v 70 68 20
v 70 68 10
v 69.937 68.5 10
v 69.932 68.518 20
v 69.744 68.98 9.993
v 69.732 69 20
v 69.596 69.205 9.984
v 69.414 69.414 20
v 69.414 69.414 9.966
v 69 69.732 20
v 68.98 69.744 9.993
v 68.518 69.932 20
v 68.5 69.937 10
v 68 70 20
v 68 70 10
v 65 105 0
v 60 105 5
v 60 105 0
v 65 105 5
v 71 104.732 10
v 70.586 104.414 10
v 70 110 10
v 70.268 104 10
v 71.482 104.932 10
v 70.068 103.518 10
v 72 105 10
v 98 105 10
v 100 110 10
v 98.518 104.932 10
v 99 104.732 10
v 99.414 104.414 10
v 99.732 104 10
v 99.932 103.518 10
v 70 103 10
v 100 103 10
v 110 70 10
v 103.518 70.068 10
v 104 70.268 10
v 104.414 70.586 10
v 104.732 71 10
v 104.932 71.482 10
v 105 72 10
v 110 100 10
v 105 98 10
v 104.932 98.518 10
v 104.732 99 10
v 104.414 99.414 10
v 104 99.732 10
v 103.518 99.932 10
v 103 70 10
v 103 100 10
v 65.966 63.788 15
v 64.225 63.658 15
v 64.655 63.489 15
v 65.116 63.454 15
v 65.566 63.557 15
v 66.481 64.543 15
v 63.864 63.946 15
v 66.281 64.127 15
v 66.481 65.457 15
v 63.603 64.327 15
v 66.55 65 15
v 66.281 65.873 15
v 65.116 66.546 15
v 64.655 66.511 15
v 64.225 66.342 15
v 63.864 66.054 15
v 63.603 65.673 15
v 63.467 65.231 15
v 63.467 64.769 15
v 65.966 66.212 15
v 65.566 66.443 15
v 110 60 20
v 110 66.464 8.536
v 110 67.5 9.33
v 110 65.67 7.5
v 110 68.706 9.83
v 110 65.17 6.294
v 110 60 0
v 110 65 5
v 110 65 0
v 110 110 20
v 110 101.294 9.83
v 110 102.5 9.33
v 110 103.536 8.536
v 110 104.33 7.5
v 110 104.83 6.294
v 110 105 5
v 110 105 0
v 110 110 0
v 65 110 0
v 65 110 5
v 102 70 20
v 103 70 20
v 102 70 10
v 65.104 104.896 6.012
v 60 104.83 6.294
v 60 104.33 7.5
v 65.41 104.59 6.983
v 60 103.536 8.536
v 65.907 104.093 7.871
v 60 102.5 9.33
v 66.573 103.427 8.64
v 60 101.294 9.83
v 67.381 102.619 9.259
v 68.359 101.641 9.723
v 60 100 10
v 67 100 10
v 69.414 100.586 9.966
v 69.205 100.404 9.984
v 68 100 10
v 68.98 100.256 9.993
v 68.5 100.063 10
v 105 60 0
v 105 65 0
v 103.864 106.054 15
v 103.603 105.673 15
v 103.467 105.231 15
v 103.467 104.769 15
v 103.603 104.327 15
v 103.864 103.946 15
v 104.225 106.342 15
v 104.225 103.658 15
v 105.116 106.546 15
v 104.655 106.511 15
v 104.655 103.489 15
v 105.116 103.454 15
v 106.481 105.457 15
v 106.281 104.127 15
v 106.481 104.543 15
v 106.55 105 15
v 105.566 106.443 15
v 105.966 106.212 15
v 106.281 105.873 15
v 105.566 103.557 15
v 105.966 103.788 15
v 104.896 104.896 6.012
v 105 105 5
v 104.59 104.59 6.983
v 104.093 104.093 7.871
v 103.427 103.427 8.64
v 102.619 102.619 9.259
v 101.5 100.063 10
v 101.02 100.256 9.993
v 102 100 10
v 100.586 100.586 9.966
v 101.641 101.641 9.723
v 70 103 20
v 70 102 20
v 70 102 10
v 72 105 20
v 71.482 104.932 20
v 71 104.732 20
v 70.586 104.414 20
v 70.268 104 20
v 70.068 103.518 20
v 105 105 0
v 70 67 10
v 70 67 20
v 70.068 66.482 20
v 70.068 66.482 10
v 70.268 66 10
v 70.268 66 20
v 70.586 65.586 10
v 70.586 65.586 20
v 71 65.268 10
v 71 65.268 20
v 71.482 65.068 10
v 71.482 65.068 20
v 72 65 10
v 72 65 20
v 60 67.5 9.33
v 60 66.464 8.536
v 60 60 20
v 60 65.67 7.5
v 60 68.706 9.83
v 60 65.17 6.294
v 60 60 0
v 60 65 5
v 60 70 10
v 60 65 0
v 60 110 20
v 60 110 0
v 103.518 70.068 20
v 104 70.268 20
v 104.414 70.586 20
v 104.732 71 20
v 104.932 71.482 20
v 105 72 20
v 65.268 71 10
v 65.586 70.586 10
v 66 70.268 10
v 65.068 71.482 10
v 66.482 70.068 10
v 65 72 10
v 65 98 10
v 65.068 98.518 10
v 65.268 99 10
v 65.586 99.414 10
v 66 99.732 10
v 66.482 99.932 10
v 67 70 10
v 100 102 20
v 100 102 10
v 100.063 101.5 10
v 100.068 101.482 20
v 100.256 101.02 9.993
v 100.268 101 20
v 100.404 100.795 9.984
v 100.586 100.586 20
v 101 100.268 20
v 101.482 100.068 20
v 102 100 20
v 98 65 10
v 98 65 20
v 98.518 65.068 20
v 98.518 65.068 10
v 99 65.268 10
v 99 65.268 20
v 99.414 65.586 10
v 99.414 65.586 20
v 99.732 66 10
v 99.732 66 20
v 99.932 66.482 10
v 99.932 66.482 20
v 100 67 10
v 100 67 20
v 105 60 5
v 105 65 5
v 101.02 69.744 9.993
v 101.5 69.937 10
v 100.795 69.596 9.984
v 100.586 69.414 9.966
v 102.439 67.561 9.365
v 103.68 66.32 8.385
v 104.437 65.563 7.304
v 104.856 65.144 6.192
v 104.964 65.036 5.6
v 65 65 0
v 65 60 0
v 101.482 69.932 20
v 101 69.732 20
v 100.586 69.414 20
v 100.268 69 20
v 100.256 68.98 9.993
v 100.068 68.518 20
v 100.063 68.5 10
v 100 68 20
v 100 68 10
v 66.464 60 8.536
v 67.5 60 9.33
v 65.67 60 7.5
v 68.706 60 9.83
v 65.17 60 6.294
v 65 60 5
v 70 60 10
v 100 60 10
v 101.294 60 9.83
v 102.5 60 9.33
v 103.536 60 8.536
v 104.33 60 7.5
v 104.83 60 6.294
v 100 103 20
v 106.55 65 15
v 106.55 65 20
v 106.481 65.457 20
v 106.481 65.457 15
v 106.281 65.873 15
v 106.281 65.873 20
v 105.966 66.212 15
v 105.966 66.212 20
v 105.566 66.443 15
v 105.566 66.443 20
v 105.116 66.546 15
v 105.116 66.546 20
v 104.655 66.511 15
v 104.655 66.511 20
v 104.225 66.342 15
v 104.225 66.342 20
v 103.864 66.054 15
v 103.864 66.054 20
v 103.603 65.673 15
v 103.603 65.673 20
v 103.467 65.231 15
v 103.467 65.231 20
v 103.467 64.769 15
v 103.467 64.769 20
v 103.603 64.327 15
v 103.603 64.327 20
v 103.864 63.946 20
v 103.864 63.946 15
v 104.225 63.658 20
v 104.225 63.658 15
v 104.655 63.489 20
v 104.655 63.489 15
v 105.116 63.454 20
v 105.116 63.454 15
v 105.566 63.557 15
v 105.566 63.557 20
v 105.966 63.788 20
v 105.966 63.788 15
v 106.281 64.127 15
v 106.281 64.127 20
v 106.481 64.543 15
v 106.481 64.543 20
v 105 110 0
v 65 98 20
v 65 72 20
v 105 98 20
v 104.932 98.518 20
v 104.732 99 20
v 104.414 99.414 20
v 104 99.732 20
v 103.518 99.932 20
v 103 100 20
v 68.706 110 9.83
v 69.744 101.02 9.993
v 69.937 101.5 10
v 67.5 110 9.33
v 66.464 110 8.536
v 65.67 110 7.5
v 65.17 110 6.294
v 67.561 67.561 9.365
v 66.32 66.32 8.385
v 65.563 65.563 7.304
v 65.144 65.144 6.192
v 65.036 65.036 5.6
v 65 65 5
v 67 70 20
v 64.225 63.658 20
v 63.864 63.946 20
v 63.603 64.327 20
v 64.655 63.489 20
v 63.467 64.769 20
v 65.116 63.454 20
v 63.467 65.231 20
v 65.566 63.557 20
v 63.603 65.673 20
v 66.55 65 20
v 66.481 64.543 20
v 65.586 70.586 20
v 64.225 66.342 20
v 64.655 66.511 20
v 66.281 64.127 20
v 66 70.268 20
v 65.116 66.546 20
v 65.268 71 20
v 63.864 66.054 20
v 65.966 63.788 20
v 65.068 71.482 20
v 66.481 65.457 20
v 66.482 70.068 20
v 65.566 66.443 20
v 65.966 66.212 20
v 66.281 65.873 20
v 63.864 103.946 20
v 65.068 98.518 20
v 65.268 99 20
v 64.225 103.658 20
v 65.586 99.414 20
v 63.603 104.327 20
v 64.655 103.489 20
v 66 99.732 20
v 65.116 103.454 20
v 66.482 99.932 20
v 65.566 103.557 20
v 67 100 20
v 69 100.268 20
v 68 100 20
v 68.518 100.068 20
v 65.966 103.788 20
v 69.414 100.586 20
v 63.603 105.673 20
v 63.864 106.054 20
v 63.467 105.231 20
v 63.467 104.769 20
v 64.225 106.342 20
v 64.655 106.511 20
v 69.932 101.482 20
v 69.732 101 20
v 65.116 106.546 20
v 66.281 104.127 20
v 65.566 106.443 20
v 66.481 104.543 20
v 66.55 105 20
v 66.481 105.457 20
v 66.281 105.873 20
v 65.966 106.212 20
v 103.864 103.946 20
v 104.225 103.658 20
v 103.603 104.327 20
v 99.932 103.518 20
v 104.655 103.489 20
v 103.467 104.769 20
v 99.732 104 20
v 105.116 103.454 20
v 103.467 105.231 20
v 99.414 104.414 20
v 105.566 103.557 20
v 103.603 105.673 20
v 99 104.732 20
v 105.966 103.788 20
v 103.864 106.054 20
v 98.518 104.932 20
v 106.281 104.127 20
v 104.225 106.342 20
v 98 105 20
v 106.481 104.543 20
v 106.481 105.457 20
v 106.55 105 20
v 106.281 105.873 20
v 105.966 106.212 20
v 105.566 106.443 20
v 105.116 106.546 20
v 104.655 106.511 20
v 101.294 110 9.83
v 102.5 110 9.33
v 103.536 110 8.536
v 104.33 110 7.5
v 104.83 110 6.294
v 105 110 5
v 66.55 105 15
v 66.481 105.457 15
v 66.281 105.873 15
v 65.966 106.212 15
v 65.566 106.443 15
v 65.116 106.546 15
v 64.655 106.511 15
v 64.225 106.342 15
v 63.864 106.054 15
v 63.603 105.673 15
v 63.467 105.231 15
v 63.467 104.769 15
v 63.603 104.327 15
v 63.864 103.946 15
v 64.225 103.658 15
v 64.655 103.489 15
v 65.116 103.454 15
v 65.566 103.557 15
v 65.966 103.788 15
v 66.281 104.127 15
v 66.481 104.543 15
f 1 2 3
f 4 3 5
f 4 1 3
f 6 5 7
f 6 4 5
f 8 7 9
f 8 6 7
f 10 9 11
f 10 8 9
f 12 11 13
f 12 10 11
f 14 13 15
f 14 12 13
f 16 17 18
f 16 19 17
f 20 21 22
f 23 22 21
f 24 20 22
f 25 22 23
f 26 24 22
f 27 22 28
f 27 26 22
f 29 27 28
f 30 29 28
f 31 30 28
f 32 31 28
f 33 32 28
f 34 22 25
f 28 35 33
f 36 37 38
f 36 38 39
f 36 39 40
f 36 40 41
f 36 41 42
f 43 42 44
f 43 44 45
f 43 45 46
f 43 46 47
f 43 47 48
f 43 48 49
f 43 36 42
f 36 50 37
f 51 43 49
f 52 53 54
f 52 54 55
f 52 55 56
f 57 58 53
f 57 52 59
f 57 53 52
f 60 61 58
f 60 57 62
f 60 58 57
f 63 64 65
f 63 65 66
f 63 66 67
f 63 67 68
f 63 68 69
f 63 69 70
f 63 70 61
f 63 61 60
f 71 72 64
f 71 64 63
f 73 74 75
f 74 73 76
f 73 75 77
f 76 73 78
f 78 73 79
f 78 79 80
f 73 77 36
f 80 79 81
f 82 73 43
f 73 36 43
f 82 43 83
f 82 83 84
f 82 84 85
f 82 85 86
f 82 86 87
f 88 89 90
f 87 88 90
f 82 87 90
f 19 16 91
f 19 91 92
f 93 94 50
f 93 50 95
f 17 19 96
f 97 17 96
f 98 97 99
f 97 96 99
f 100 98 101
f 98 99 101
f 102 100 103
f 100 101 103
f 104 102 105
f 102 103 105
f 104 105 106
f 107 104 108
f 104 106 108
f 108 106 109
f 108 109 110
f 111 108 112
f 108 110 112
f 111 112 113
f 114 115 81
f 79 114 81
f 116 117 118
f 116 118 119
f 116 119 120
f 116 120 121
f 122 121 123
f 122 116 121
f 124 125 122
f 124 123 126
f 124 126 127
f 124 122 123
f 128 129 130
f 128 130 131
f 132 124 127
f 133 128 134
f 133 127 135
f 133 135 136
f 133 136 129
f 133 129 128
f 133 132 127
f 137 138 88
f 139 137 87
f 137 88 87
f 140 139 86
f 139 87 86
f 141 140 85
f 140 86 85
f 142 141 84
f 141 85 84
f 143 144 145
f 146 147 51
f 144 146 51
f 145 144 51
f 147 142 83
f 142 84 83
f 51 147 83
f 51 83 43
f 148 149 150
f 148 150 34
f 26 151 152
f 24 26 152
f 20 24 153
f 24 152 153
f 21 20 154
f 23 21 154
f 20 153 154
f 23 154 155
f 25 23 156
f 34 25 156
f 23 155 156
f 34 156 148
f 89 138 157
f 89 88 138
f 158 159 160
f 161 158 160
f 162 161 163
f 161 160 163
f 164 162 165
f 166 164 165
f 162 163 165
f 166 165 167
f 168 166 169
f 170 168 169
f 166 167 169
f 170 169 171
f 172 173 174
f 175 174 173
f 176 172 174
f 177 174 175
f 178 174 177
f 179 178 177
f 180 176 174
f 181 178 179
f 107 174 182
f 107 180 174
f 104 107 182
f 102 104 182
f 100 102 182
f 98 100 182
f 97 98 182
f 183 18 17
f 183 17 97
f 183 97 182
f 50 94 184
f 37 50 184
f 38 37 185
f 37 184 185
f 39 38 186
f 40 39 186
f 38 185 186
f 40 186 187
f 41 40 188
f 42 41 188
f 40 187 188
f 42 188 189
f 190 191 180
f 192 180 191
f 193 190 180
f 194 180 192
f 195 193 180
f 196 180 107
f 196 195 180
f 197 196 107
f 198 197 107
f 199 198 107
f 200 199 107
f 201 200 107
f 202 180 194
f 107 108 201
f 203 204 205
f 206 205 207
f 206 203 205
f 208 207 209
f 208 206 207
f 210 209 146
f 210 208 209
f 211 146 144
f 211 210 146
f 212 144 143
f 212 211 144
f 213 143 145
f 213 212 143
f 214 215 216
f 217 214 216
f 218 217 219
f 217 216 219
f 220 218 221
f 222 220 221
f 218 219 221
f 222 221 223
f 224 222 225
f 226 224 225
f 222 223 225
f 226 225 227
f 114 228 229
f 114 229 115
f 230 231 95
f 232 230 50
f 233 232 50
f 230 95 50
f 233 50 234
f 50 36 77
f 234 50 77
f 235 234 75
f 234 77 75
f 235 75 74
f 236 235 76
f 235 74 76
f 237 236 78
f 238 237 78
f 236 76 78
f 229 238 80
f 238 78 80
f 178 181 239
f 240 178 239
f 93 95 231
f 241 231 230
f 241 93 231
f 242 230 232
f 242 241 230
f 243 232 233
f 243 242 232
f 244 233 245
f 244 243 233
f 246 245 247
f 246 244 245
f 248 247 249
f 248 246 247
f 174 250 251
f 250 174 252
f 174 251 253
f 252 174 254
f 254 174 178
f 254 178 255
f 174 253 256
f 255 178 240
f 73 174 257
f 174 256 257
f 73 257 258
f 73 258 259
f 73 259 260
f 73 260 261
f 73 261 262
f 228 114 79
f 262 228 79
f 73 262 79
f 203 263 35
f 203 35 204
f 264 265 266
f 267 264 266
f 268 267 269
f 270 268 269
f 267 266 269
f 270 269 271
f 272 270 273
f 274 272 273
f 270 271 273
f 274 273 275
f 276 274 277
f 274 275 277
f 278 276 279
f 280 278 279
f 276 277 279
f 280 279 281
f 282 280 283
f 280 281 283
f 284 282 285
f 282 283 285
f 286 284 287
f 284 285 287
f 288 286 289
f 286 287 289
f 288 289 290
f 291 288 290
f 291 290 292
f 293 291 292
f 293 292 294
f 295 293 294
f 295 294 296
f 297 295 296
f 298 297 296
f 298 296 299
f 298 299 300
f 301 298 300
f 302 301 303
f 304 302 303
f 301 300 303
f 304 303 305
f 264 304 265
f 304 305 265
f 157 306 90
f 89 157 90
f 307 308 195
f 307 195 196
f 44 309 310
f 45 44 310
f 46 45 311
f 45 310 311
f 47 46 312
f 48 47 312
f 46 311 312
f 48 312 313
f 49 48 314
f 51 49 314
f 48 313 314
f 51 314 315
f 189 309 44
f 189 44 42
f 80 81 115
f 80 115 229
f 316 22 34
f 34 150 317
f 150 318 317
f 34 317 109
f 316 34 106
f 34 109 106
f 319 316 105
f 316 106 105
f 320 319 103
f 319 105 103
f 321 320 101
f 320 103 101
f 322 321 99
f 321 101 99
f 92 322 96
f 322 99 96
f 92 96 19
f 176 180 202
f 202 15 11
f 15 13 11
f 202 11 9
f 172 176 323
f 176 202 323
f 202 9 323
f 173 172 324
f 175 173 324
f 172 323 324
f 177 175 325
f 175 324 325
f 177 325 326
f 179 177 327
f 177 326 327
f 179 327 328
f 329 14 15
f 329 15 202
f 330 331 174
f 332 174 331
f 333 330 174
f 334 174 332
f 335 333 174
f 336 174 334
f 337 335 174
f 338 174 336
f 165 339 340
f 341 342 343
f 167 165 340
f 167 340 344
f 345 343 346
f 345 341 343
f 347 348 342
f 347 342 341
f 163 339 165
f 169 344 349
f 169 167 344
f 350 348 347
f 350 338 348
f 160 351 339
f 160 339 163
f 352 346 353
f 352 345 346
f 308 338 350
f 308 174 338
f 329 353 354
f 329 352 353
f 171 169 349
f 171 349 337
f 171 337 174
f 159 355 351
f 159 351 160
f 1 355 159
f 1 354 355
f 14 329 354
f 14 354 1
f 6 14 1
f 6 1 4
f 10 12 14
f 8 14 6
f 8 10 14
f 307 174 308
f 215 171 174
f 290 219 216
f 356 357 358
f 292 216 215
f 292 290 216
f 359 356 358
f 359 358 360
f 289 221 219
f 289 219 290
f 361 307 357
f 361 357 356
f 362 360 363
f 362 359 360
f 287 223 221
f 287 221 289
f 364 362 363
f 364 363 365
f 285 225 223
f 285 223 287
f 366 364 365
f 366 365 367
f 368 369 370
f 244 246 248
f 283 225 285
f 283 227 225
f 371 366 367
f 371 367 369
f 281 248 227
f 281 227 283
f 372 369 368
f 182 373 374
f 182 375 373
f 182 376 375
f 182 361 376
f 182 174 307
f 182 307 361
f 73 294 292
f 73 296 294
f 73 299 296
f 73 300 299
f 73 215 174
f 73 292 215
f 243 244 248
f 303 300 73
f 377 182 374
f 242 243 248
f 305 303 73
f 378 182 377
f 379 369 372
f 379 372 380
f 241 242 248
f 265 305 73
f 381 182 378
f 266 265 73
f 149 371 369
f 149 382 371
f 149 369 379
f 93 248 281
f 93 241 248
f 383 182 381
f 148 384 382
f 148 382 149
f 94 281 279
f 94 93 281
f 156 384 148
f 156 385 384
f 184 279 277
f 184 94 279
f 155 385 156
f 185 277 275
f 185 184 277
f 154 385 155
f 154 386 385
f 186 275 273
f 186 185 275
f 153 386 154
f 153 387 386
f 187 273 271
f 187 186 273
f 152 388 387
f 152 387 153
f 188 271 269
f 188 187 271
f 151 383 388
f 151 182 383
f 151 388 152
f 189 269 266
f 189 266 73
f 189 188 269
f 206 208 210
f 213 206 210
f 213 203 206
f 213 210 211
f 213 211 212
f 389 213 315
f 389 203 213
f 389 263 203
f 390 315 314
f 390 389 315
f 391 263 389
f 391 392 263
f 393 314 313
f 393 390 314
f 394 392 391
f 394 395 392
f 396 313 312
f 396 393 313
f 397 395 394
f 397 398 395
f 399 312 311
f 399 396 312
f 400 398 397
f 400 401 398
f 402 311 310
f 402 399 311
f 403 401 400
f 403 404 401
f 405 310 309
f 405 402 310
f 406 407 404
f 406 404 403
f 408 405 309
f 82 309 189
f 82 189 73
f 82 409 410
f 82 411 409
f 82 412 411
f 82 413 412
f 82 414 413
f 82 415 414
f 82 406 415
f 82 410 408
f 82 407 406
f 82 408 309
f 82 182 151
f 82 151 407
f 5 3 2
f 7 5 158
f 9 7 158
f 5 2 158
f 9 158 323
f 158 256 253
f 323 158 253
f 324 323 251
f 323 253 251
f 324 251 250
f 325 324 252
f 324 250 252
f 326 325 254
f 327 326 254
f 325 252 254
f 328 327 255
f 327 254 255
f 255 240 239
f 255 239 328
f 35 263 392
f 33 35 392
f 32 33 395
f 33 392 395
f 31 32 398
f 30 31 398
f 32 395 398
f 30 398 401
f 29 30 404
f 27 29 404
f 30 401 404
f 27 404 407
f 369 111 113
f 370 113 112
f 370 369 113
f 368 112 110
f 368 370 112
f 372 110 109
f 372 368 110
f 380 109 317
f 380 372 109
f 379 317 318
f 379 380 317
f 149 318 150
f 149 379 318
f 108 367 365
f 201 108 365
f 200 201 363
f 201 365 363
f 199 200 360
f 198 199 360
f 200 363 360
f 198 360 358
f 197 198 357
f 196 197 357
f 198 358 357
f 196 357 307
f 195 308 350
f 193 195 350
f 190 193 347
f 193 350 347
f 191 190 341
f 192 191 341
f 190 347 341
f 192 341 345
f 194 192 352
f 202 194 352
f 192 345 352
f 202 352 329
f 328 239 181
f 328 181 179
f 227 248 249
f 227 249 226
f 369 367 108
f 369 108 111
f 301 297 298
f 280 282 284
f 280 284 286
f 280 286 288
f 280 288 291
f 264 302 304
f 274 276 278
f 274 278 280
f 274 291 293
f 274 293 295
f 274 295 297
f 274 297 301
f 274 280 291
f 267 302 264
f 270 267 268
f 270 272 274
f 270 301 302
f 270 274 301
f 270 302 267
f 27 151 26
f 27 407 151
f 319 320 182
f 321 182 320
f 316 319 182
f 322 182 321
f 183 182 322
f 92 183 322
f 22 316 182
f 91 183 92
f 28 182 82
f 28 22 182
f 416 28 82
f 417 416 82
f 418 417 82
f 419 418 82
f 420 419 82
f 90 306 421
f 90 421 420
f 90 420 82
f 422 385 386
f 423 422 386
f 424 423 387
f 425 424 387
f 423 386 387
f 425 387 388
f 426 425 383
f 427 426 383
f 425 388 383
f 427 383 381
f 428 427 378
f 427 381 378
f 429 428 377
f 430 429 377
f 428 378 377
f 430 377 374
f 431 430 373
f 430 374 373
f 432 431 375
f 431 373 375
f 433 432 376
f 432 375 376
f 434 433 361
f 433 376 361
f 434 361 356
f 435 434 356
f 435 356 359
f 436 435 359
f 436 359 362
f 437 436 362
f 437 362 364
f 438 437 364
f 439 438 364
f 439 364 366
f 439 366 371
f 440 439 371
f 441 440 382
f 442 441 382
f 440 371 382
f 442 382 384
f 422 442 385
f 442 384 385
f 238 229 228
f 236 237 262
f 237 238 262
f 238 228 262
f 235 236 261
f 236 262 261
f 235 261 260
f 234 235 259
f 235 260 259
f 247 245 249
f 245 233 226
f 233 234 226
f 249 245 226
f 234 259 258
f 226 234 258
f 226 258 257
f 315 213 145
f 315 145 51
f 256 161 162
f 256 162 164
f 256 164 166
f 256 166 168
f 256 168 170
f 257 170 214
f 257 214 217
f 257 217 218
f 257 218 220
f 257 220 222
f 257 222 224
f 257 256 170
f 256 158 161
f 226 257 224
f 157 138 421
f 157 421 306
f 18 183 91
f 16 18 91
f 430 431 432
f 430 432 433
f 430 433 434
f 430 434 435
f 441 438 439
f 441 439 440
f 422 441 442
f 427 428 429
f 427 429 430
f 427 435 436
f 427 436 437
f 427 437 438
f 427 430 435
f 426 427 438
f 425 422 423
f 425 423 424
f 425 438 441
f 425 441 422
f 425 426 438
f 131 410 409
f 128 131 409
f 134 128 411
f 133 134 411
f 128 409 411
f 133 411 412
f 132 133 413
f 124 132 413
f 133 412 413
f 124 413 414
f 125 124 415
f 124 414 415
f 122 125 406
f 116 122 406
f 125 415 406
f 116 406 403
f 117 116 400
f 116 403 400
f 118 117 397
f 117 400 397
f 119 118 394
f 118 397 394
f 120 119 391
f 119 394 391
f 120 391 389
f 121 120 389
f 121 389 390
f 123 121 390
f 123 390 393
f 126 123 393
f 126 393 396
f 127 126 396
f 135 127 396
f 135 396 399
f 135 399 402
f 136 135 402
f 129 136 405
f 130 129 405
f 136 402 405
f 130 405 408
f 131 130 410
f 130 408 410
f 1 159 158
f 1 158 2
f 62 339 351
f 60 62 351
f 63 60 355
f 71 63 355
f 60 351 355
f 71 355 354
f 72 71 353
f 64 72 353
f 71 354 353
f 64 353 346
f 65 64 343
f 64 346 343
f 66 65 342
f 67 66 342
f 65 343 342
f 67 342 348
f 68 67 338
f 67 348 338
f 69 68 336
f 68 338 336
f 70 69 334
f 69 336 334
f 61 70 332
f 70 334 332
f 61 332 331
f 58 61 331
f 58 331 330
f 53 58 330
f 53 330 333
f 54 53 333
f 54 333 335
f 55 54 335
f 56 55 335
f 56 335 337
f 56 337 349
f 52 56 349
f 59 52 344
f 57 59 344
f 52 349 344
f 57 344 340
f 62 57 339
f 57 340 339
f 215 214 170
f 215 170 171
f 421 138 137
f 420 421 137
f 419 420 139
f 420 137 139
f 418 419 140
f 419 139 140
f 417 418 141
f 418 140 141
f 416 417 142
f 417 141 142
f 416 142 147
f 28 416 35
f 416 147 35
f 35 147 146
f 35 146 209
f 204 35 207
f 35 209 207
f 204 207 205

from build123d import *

# Parameters (mm, degrees)
SKETCH187_W     = 50
SKETCH187_H     = 50
PAD032_DEPTH    = 20
POCKET156_DEPTH = 20.001
POCKET157_DEPTH = 50.001
POCKET158_DEPTH = 50.001
SKETCH191_R     = 1.55
POCKET159_DEPTH = 5


with BuildPart() as part:
    # Sketch187 → Pad032 (new body)
    with BuildSketch(Plane.XY):
        Rectangle(SKETCH187_W, SKETCH187_H)
    extrude(amount=PAD032_DEPTH)

    # Sketch188 (on Face6 of Pad032) → Pocket156 (cut, through all)
    with BuildSketch(Plane.XY.offset(20)):
        with BuildLine():
            Line((-18, 15), (-17, 15))
            ThreePointArc((-17, 15), (-15.585786, 15.585786), (-15, 17))
            Line((-15, 17), (-15, 18))
            ThreePointArc((-13, 20), (-14.414214, 19.414214), (-15, 18))
            Line((-13, 20), (13, 20))
            ThreePointArc((15, 18), (14.414214, 19.414214), (13, 20))
            Line((15, 18), (15, 17))
            ThreePointArc((15, 17), (15.585786, 15.585786), (17, 15))
            Line((17, 15), (18, 15))
            ThreePointArc((20, 13), (19.414214, 14.414214), (18, 15))
            Line((20, 13), (20, -13))
            ThreePointArc((18, -15), (19.414214, -14.414214), (20, -13))
            Line((18, -15), (17, -15))
            ThreePointArc((17, -15), (15.585786, -15.585786), (15, -17))
            Line((15, -17), (15, -18))
            ThreePointArc((13, -20), (14.414214, -19.414214), (15, -18))
            Line((13, -20), (-13, -20))
            ThreePointArc((-15, -18), (-14.414214, -19.414214), (-13, -20))
            Line((-15, -18), (-15, -17))
            ThreePointArc((-15, -17), (-15.585786, -15.585786), (-17, -15))
            Line((-17, -15), (-18, -15))
            ThreePointArc((-20, -13), (-19.414214, -14.414214), (-18, -15))
            Line((-20, -13), (-20, 13))
            ThreePointArc((-18, 15), (-19.414214, 14.414214), (-20, 13))
        make_face()
    extrude(amount=-POCKET156_DEPTH, mode=Mode.SUBTRACT)

    # Sketch189 (on Face3 of Pocket156) → Pocket157 (cut, through all)
    with BuildSketch(Plane.YZ.offset(25)):
        with BuildLine():
            Line((-15, 10), (15, 10))
            ThreePointArc((20, 5), (18.535534, 8.535534), (15, 10))
            Line((20, 5), (20, 0))
            Line((20, 0), (-20, 0))
            Line((-20, 0), (-20, 5))
            ThreePointArc((-15, 10), (-18.535534, 8.535534), (-20, 5))
        make_face()
    extrude(amount=-POCKET157_DEPTH, mode=Mode.SUBTRACT)

    # Sketch190 (on Face6 of Pocket156) → Pocket158 (cut, through all)
    with BuildSketch(Plane.XZ.offset(25)):
        with BuildLine():
            Line((-15, 10), (15, 10))
            ThreePointArc((20, 5), (18.535534, 8.535534), (15, 10))
            Line((20, 5), (20, 0))
            Line((20, 0), (-20, 0))
            Line((-20, 0), (-20, 5))
            ThreePointArc((-15, 10), (-18.535534, 8.535534), (-20, 5))
        make_face()
    extrude(amount=-POCKET158_DEPTH, mode=Mode.SUBTRACT)

    # Sketch191 → Pocket159 (cut)
    with BuildSketch(Plane.XY.offset(20)):
        with Locations((-20, 20)):
            Circle(SKETCH191_R)
        with Locations((20, 20)):
            Circle(SKETCH191_R)
        with Locations((20, -20)):
            Circle(SKETCH191_R)
        with Locations((-20, -20)):
            Circle(SKETCH191_R)
    extrude(amount=-POCKET159_DEPTH, mode=Mode.SUBTRACT)


with BuildPart() as part_1:
    # Body033 placement: moved
    add(part.part.moved(Location((85, 85, 0))))


solid = part_1.part
